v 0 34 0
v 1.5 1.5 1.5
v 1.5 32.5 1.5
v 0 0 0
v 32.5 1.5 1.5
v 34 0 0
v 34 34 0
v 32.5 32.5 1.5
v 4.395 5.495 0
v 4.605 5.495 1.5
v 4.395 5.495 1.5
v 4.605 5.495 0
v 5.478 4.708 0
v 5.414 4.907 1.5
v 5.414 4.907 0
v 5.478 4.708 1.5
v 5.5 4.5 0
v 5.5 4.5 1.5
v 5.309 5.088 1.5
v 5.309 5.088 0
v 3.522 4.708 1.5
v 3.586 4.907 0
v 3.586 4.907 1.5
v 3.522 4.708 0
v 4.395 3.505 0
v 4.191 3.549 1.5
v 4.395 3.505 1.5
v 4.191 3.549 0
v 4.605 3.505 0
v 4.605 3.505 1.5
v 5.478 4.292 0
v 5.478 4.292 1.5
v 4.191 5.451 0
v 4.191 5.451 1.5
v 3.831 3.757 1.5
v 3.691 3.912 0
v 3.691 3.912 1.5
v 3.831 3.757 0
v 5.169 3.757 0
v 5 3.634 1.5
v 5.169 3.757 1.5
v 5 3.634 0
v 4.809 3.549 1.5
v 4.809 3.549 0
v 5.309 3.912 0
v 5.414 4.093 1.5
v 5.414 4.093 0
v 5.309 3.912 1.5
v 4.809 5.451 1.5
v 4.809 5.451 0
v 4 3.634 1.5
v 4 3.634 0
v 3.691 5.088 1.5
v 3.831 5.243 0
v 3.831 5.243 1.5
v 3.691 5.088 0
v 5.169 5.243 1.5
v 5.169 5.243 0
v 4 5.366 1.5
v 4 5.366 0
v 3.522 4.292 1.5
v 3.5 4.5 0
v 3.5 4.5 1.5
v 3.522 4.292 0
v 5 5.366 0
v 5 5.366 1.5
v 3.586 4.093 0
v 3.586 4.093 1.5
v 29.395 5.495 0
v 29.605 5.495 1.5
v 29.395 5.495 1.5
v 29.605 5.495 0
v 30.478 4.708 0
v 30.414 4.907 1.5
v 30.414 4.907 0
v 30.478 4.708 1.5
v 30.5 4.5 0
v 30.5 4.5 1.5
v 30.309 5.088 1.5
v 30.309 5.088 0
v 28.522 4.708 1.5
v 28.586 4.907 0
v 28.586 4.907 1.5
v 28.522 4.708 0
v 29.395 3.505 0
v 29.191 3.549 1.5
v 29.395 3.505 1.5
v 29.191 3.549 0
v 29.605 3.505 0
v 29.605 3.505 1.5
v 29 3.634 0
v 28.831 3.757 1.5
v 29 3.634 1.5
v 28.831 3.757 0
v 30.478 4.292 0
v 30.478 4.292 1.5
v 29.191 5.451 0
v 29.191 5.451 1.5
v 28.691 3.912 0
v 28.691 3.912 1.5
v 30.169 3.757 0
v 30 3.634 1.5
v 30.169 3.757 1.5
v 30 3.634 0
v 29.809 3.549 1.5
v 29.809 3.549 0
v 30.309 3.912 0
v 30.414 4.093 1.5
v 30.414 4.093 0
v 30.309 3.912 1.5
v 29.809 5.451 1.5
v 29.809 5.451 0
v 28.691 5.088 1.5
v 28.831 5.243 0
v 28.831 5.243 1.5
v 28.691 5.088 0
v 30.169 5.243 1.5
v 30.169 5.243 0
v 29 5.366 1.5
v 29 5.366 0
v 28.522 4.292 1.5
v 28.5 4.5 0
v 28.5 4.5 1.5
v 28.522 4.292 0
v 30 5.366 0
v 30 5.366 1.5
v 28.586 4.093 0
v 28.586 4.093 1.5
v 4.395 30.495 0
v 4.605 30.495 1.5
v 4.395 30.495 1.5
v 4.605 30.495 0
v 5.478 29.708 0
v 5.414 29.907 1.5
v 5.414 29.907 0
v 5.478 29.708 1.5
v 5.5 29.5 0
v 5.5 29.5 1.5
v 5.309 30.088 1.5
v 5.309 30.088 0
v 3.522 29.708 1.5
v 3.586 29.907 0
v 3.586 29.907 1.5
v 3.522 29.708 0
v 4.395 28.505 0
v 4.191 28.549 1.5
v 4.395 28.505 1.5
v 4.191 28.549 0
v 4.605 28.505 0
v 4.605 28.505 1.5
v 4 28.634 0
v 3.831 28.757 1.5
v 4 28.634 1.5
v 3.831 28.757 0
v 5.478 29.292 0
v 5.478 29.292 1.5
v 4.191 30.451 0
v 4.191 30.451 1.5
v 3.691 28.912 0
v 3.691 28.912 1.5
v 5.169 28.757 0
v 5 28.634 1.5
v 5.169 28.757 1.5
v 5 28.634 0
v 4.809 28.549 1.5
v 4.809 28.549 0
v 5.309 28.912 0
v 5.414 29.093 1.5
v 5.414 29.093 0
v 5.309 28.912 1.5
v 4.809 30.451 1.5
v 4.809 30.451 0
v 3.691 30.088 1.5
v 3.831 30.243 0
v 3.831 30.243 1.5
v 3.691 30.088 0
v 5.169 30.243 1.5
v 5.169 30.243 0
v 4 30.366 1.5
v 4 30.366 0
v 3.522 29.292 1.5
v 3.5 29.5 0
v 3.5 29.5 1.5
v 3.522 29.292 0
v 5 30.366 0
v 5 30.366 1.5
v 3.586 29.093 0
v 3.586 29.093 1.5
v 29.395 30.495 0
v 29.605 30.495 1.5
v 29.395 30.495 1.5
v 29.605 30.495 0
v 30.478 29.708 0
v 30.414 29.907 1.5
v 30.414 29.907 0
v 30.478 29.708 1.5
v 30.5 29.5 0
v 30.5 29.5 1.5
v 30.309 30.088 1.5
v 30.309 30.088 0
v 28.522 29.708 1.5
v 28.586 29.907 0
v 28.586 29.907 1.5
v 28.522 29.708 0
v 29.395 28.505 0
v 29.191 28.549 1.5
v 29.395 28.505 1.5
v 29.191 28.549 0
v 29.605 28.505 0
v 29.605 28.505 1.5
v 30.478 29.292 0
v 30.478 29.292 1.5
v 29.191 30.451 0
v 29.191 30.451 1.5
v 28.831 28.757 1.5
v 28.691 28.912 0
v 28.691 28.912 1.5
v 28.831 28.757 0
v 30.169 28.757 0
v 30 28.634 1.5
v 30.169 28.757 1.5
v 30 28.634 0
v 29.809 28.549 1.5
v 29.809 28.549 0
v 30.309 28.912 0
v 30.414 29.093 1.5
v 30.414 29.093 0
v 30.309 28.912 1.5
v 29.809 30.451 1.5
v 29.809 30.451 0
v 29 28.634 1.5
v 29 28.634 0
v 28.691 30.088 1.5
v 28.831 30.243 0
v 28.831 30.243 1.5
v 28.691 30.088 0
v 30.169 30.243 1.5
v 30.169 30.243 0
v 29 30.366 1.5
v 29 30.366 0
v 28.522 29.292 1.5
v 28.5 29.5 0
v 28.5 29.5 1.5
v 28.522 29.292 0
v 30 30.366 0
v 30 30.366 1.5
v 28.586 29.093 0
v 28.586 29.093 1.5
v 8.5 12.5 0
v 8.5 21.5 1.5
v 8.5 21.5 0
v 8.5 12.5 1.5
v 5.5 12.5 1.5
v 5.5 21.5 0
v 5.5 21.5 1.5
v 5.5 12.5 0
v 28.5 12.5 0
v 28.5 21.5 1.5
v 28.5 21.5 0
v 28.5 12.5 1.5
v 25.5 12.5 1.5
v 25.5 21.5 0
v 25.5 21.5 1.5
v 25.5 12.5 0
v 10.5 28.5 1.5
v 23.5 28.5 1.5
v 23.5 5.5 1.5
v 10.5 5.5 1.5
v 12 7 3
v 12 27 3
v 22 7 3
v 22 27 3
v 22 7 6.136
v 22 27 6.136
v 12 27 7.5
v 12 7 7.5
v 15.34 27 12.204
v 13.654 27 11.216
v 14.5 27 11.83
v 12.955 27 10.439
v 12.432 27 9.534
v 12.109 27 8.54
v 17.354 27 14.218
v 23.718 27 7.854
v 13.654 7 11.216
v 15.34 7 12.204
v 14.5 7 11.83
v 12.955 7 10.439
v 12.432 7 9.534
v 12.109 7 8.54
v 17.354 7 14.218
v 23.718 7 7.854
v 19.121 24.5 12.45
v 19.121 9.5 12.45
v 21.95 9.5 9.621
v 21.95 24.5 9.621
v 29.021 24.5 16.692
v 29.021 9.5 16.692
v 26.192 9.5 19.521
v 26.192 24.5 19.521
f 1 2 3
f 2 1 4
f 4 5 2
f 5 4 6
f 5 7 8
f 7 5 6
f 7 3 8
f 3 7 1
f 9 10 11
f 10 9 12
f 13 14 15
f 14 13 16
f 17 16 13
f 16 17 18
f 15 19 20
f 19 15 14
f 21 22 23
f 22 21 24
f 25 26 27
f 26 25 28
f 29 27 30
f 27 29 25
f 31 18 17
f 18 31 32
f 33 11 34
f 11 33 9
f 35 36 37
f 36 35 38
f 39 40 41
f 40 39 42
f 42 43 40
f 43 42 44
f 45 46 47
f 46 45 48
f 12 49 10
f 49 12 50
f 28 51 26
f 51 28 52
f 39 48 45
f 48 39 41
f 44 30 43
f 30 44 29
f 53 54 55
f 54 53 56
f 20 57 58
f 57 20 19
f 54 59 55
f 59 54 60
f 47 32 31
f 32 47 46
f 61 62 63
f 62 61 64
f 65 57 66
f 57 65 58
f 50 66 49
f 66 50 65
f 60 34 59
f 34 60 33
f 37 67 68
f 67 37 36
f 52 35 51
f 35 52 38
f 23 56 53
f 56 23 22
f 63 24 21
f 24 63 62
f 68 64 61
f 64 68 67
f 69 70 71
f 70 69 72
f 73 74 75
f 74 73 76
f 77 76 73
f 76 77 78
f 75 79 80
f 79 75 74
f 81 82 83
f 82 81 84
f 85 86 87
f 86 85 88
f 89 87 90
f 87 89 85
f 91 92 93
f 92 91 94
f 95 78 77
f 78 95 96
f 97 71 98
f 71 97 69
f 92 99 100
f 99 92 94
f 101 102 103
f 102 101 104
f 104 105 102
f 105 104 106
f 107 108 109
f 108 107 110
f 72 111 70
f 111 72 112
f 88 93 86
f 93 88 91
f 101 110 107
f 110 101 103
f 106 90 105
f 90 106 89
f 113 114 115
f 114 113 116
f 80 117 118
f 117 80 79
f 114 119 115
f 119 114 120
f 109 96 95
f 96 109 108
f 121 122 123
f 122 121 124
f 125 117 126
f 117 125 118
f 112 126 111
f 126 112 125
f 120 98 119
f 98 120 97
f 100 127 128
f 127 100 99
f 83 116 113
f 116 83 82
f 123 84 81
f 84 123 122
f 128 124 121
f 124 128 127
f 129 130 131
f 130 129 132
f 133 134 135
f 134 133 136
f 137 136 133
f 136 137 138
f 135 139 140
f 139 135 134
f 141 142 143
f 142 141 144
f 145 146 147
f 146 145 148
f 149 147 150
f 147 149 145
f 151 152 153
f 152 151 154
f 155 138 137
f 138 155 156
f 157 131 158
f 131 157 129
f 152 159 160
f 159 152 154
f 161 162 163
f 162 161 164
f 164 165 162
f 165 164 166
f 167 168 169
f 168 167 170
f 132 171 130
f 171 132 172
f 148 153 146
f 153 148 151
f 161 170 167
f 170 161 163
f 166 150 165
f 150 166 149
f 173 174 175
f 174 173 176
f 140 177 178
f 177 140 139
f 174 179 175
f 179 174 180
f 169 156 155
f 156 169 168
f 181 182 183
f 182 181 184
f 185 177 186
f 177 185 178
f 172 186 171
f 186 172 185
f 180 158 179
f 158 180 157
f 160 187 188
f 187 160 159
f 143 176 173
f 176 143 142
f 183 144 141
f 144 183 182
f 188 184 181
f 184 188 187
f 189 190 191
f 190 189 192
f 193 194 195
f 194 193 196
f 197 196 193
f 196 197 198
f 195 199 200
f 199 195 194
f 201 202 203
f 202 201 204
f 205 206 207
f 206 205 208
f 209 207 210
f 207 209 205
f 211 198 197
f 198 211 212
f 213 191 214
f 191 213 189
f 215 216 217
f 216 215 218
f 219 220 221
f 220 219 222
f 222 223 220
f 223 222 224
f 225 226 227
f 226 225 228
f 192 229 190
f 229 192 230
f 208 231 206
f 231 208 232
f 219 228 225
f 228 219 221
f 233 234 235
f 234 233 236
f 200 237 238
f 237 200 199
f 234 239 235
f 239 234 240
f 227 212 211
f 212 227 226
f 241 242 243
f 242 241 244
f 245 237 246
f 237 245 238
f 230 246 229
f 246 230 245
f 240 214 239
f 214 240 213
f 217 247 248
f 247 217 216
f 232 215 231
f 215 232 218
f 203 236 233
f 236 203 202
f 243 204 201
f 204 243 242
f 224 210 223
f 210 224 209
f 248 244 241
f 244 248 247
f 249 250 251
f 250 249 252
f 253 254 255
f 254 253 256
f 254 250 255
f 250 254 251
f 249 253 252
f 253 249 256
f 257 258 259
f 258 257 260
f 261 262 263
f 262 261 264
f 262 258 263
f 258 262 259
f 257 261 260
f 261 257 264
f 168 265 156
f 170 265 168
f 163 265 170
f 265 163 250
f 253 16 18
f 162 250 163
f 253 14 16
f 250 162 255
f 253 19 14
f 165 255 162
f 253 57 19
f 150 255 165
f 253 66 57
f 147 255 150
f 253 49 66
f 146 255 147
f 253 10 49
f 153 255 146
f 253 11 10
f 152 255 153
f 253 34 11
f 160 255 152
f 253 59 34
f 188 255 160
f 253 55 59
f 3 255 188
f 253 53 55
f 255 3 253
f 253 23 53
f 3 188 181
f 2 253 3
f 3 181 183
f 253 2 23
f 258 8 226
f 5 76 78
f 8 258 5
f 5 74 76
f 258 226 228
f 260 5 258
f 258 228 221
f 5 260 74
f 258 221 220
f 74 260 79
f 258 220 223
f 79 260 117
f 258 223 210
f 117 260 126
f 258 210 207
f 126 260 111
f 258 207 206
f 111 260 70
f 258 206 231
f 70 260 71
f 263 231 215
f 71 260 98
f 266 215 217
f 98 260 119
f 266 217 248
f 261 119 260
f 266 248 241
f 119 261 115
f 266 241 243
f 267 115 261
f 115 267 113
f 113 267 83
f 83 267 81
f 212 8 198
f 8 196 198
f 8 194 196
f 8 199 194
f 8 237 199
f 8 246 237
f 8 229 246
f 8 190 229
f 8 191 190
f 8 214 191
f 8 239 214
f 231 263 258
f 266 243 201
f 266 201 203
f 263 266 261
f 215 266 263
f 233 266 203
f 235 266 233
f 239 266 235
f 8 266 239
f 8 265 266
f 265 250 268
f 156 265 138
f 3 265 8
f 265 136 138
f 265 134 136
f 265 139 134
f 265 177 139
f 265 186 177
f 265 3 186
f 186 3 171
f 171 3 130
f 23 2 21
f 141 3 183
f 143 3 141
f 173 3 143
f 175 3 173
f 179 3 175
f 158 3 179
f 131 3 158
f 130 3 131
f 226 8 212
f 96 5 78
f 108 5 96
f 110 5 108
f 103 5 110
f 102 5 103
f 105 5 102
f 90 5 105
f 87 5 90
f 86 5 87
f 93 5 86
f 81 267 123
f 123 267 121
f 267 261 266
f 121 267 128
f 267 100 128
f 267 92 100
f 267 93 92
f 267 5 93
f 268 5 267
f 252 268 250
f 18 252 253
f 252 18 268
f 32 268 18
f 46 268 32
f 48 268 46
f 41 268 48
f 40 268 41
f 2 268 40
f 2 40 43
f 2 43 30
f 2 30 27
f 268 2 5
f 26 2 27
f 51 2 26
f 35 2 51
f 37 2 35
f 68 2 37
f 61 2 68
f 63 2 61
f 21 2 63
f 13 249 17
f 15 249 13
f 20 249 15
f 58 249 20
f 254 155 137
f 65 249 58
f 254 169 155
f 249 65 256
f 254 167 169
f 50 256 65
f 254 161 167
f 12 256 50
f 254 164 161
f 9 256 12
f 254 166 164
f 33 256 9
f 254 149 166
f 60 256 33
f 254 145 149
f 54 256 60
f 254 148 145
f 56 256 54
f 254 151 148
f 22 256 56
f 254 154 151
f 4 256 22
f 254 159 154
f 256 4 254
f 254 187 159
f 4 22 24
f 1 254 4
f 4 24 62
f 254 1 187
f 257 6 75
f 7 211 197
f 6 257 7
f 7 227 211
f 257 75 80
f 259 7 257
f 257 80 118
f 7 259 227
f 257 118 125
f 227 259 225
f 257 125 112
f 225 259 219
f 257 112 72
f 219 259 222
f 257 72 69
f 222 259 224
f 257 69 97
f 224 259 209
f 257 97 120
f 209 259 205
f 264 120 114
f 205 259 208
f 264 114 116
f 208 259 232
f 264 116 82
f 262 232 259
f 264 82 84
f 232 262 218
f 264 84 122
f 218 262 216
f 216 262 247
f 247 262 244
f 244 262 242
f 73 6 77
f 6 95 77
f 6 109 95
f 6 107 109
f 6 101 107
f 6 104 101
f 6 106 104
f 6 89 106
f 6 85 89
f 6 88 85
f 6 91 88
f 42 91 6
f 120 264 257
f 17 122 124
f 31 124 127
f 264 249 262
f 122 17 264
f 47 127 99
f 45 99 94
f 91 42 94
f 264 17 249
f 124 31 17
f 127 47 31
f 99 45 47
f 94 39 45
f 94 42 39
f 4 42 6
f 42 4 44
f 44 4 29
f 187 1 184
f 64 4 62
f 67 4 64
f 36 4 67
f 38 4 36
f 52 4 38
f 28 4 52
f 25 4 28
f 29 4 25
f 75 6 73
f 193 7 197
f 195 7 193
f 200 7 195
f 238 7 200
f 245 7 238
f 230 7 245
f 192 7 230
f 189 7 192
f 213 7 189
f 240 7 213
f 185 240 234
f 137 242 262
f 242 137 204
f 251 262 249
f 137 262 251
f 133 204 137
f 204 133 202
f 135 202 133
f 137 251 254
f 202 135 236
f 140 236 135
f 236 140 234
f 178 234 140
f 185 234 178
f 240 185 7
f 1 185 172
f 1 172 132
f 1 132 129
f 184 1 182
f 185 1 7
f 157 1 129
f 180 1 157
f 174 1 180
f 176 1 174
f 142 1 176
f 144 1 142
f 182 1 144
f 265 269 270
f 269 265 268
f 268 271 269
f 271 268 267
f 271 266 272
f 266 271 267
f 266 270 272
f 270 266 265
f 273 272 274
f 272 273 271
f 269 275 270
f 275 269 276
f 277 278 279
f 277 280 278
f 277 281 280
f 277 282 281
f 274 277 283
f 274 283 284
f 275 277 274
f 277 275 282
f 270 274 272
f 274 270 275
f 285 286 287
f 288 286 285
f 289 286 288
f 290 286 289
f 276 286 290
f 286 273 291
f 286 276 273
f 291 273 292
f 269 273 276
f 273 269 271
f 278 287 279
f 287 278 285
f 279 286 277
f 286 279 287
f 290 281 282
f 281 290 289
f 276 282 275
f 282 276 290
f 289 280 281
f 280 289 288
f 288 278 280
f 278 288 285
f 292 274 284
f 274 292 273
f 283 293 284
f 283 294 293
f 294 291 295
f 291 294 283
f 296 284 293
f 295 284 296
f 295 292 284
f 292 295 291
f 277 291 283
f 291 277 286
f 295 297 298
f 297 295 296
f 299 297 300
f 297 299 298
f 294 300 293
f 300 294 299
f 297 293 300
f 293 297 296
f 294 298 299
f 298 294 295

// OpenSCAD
// title      : RoboGen parametric B part
// author     : Alice Concordel

partB(45); //the parameter is the angle of the parametric part

module partB(alpha)
{
//plate parameters
	lengthSlide = 34;
	widthSlide = 34;
	heightSlide = 1.5;
	
	radiusHole = 1;

//wire hole parameters
	lengthWire = 3;
	widthWire = 9;
	heightWire = heightSlide;

//joint base parameters
	lengthBase = 10;
	widthBase = 20;
	heightBase = 6;
	
//cylinder parameters
	radiusCylinderBase = 5;
	heightCylinderBase = 20;
	
//rotating cube top part parameters
	lengthTop = 9;
	widthTop = 20;
	heightTop = 5;
	
	lengthEnd = 4;
	widthEnd = 15;
	heightEnd = 10;
	
	
	union()
	{
		difference()
		{
			// starting plate
			cube([lengthSlide,widthSlide,1.5]);
			
			union()
			{
			// chamfer the edges of the plate
				rotate ([0,-45,0]) cube([3,widthSlide,3]);
				rotate([45,0,0]) cube([lengthSlide,3,3]);
				translate([lengthSlide,0,0]) rotate([0,-45,0]) cube([3,widthSlide,3]);
				translate([0,widthSlide,0]) rotate([45,0,0]) cube([lengthSlide,3,3]);

			// holes in the plate
					//round holes
				translate([4.5,4.5,-0.5]) cylinder(r = radiusHole, h = heightSlide+1, $fn = 30);
				translate([lengthSlide-4.5,4.5,-0.5]) cylinder(r = radiusHole, h = heightSlide+1, $fn = 30);
				translate([4.5,widthSlide-4.5,-0.5]) cylinder(r = radiusHole, h = heightSlide+1, $fn = 30);
				translate([lengthSlide-4.5,widthSlide-4.5,-0.5]) cylinder(r = radiusHole, h = heightSlide+1, $fn = 30);
				
					//rectangular wire holes
				translate([7-lengthWire/2,widthSlide/2-widthWire/2,-0.5]) cube([lengthWire,widthWire,heightWire+1]);
				translate([lengthSlide-7-lengthWire/2,widthSlide/2-widthWire/2,-0.5]) cube([lengthWire,widthWire,heightWire+1]);
			}
		}
		// base of shaft part
		translate([lengthSlide/2-10/2,widthSlide/2-20/2,0]) cube([lengthBase,widthBase,heightBase+heightSlide]);
	
		//chamfer the edges of the shaft base
		difference()
		{
			translate([lengthSlide/2-(lengthBase+3)/2,widthSlide/2-(widthBase+3)/2]) cube([lengthBase+3,widthBase+3,3]);
			union()
			{
			translate([lengthSlide/2-lengthBase/2-heightSlide,0,heightSlide]) rotate ([0,-45,0]) cube([heightSlide*sqrt(2),34,heightSlide*sqrt(2)]);
			translate([0,widthSlide/2-widthBase/2-heightSlide,heightSlide]) rotate([45,0,0]) cube([lengthSlide,heightSlide*sqrt(2),heightSlide*sqrt(2)]);
			translate([lengthSlide/2+lengthBase/2+heightSlide,0,heightSlide]) rotate([0,-45,0]) cube([heightSlide*sqrt(2),34,heightSlide*sqrt(2)]);
			translate([0,widthSlide/2+widthBase/2+heightSlide,heightSlide]) rotate([45,0,0]) cube([lengthSlide,heightSlide*sqrt(2),heightSlide*sqrt(2)]);
			}
		}

		// cylinder or rounded part
		translate([lengthSlide/2,widthSlide/2-heightCylinderBase/2,heightBase+heightSlide]) rotate([-90,0,0]) cylinder(r = radiusCylinderBase, h = heightCylinderBase, $fn = 30);
		
		// next part of join = Box over one smaller Box
		//========================== angle parameter below
		translate([lengthSlide/2,widthSlide/2-widthTop/2,heightSlide+heightBase]) rotate([0,alpha,0]) translate([-lengthTop/2,0,0]) cube([lengthTop,widthTop,heightTop]);
		translate([lengthSlide/2,widthSlide/2-widthEnd/2,heightSlide+heightBase]) rotate([0,alpha,0]) translate([-lengthEnd/2,0,0]) cube([lengthEnd,widthEnd,heightEnd+heightTop]);
	}
}
